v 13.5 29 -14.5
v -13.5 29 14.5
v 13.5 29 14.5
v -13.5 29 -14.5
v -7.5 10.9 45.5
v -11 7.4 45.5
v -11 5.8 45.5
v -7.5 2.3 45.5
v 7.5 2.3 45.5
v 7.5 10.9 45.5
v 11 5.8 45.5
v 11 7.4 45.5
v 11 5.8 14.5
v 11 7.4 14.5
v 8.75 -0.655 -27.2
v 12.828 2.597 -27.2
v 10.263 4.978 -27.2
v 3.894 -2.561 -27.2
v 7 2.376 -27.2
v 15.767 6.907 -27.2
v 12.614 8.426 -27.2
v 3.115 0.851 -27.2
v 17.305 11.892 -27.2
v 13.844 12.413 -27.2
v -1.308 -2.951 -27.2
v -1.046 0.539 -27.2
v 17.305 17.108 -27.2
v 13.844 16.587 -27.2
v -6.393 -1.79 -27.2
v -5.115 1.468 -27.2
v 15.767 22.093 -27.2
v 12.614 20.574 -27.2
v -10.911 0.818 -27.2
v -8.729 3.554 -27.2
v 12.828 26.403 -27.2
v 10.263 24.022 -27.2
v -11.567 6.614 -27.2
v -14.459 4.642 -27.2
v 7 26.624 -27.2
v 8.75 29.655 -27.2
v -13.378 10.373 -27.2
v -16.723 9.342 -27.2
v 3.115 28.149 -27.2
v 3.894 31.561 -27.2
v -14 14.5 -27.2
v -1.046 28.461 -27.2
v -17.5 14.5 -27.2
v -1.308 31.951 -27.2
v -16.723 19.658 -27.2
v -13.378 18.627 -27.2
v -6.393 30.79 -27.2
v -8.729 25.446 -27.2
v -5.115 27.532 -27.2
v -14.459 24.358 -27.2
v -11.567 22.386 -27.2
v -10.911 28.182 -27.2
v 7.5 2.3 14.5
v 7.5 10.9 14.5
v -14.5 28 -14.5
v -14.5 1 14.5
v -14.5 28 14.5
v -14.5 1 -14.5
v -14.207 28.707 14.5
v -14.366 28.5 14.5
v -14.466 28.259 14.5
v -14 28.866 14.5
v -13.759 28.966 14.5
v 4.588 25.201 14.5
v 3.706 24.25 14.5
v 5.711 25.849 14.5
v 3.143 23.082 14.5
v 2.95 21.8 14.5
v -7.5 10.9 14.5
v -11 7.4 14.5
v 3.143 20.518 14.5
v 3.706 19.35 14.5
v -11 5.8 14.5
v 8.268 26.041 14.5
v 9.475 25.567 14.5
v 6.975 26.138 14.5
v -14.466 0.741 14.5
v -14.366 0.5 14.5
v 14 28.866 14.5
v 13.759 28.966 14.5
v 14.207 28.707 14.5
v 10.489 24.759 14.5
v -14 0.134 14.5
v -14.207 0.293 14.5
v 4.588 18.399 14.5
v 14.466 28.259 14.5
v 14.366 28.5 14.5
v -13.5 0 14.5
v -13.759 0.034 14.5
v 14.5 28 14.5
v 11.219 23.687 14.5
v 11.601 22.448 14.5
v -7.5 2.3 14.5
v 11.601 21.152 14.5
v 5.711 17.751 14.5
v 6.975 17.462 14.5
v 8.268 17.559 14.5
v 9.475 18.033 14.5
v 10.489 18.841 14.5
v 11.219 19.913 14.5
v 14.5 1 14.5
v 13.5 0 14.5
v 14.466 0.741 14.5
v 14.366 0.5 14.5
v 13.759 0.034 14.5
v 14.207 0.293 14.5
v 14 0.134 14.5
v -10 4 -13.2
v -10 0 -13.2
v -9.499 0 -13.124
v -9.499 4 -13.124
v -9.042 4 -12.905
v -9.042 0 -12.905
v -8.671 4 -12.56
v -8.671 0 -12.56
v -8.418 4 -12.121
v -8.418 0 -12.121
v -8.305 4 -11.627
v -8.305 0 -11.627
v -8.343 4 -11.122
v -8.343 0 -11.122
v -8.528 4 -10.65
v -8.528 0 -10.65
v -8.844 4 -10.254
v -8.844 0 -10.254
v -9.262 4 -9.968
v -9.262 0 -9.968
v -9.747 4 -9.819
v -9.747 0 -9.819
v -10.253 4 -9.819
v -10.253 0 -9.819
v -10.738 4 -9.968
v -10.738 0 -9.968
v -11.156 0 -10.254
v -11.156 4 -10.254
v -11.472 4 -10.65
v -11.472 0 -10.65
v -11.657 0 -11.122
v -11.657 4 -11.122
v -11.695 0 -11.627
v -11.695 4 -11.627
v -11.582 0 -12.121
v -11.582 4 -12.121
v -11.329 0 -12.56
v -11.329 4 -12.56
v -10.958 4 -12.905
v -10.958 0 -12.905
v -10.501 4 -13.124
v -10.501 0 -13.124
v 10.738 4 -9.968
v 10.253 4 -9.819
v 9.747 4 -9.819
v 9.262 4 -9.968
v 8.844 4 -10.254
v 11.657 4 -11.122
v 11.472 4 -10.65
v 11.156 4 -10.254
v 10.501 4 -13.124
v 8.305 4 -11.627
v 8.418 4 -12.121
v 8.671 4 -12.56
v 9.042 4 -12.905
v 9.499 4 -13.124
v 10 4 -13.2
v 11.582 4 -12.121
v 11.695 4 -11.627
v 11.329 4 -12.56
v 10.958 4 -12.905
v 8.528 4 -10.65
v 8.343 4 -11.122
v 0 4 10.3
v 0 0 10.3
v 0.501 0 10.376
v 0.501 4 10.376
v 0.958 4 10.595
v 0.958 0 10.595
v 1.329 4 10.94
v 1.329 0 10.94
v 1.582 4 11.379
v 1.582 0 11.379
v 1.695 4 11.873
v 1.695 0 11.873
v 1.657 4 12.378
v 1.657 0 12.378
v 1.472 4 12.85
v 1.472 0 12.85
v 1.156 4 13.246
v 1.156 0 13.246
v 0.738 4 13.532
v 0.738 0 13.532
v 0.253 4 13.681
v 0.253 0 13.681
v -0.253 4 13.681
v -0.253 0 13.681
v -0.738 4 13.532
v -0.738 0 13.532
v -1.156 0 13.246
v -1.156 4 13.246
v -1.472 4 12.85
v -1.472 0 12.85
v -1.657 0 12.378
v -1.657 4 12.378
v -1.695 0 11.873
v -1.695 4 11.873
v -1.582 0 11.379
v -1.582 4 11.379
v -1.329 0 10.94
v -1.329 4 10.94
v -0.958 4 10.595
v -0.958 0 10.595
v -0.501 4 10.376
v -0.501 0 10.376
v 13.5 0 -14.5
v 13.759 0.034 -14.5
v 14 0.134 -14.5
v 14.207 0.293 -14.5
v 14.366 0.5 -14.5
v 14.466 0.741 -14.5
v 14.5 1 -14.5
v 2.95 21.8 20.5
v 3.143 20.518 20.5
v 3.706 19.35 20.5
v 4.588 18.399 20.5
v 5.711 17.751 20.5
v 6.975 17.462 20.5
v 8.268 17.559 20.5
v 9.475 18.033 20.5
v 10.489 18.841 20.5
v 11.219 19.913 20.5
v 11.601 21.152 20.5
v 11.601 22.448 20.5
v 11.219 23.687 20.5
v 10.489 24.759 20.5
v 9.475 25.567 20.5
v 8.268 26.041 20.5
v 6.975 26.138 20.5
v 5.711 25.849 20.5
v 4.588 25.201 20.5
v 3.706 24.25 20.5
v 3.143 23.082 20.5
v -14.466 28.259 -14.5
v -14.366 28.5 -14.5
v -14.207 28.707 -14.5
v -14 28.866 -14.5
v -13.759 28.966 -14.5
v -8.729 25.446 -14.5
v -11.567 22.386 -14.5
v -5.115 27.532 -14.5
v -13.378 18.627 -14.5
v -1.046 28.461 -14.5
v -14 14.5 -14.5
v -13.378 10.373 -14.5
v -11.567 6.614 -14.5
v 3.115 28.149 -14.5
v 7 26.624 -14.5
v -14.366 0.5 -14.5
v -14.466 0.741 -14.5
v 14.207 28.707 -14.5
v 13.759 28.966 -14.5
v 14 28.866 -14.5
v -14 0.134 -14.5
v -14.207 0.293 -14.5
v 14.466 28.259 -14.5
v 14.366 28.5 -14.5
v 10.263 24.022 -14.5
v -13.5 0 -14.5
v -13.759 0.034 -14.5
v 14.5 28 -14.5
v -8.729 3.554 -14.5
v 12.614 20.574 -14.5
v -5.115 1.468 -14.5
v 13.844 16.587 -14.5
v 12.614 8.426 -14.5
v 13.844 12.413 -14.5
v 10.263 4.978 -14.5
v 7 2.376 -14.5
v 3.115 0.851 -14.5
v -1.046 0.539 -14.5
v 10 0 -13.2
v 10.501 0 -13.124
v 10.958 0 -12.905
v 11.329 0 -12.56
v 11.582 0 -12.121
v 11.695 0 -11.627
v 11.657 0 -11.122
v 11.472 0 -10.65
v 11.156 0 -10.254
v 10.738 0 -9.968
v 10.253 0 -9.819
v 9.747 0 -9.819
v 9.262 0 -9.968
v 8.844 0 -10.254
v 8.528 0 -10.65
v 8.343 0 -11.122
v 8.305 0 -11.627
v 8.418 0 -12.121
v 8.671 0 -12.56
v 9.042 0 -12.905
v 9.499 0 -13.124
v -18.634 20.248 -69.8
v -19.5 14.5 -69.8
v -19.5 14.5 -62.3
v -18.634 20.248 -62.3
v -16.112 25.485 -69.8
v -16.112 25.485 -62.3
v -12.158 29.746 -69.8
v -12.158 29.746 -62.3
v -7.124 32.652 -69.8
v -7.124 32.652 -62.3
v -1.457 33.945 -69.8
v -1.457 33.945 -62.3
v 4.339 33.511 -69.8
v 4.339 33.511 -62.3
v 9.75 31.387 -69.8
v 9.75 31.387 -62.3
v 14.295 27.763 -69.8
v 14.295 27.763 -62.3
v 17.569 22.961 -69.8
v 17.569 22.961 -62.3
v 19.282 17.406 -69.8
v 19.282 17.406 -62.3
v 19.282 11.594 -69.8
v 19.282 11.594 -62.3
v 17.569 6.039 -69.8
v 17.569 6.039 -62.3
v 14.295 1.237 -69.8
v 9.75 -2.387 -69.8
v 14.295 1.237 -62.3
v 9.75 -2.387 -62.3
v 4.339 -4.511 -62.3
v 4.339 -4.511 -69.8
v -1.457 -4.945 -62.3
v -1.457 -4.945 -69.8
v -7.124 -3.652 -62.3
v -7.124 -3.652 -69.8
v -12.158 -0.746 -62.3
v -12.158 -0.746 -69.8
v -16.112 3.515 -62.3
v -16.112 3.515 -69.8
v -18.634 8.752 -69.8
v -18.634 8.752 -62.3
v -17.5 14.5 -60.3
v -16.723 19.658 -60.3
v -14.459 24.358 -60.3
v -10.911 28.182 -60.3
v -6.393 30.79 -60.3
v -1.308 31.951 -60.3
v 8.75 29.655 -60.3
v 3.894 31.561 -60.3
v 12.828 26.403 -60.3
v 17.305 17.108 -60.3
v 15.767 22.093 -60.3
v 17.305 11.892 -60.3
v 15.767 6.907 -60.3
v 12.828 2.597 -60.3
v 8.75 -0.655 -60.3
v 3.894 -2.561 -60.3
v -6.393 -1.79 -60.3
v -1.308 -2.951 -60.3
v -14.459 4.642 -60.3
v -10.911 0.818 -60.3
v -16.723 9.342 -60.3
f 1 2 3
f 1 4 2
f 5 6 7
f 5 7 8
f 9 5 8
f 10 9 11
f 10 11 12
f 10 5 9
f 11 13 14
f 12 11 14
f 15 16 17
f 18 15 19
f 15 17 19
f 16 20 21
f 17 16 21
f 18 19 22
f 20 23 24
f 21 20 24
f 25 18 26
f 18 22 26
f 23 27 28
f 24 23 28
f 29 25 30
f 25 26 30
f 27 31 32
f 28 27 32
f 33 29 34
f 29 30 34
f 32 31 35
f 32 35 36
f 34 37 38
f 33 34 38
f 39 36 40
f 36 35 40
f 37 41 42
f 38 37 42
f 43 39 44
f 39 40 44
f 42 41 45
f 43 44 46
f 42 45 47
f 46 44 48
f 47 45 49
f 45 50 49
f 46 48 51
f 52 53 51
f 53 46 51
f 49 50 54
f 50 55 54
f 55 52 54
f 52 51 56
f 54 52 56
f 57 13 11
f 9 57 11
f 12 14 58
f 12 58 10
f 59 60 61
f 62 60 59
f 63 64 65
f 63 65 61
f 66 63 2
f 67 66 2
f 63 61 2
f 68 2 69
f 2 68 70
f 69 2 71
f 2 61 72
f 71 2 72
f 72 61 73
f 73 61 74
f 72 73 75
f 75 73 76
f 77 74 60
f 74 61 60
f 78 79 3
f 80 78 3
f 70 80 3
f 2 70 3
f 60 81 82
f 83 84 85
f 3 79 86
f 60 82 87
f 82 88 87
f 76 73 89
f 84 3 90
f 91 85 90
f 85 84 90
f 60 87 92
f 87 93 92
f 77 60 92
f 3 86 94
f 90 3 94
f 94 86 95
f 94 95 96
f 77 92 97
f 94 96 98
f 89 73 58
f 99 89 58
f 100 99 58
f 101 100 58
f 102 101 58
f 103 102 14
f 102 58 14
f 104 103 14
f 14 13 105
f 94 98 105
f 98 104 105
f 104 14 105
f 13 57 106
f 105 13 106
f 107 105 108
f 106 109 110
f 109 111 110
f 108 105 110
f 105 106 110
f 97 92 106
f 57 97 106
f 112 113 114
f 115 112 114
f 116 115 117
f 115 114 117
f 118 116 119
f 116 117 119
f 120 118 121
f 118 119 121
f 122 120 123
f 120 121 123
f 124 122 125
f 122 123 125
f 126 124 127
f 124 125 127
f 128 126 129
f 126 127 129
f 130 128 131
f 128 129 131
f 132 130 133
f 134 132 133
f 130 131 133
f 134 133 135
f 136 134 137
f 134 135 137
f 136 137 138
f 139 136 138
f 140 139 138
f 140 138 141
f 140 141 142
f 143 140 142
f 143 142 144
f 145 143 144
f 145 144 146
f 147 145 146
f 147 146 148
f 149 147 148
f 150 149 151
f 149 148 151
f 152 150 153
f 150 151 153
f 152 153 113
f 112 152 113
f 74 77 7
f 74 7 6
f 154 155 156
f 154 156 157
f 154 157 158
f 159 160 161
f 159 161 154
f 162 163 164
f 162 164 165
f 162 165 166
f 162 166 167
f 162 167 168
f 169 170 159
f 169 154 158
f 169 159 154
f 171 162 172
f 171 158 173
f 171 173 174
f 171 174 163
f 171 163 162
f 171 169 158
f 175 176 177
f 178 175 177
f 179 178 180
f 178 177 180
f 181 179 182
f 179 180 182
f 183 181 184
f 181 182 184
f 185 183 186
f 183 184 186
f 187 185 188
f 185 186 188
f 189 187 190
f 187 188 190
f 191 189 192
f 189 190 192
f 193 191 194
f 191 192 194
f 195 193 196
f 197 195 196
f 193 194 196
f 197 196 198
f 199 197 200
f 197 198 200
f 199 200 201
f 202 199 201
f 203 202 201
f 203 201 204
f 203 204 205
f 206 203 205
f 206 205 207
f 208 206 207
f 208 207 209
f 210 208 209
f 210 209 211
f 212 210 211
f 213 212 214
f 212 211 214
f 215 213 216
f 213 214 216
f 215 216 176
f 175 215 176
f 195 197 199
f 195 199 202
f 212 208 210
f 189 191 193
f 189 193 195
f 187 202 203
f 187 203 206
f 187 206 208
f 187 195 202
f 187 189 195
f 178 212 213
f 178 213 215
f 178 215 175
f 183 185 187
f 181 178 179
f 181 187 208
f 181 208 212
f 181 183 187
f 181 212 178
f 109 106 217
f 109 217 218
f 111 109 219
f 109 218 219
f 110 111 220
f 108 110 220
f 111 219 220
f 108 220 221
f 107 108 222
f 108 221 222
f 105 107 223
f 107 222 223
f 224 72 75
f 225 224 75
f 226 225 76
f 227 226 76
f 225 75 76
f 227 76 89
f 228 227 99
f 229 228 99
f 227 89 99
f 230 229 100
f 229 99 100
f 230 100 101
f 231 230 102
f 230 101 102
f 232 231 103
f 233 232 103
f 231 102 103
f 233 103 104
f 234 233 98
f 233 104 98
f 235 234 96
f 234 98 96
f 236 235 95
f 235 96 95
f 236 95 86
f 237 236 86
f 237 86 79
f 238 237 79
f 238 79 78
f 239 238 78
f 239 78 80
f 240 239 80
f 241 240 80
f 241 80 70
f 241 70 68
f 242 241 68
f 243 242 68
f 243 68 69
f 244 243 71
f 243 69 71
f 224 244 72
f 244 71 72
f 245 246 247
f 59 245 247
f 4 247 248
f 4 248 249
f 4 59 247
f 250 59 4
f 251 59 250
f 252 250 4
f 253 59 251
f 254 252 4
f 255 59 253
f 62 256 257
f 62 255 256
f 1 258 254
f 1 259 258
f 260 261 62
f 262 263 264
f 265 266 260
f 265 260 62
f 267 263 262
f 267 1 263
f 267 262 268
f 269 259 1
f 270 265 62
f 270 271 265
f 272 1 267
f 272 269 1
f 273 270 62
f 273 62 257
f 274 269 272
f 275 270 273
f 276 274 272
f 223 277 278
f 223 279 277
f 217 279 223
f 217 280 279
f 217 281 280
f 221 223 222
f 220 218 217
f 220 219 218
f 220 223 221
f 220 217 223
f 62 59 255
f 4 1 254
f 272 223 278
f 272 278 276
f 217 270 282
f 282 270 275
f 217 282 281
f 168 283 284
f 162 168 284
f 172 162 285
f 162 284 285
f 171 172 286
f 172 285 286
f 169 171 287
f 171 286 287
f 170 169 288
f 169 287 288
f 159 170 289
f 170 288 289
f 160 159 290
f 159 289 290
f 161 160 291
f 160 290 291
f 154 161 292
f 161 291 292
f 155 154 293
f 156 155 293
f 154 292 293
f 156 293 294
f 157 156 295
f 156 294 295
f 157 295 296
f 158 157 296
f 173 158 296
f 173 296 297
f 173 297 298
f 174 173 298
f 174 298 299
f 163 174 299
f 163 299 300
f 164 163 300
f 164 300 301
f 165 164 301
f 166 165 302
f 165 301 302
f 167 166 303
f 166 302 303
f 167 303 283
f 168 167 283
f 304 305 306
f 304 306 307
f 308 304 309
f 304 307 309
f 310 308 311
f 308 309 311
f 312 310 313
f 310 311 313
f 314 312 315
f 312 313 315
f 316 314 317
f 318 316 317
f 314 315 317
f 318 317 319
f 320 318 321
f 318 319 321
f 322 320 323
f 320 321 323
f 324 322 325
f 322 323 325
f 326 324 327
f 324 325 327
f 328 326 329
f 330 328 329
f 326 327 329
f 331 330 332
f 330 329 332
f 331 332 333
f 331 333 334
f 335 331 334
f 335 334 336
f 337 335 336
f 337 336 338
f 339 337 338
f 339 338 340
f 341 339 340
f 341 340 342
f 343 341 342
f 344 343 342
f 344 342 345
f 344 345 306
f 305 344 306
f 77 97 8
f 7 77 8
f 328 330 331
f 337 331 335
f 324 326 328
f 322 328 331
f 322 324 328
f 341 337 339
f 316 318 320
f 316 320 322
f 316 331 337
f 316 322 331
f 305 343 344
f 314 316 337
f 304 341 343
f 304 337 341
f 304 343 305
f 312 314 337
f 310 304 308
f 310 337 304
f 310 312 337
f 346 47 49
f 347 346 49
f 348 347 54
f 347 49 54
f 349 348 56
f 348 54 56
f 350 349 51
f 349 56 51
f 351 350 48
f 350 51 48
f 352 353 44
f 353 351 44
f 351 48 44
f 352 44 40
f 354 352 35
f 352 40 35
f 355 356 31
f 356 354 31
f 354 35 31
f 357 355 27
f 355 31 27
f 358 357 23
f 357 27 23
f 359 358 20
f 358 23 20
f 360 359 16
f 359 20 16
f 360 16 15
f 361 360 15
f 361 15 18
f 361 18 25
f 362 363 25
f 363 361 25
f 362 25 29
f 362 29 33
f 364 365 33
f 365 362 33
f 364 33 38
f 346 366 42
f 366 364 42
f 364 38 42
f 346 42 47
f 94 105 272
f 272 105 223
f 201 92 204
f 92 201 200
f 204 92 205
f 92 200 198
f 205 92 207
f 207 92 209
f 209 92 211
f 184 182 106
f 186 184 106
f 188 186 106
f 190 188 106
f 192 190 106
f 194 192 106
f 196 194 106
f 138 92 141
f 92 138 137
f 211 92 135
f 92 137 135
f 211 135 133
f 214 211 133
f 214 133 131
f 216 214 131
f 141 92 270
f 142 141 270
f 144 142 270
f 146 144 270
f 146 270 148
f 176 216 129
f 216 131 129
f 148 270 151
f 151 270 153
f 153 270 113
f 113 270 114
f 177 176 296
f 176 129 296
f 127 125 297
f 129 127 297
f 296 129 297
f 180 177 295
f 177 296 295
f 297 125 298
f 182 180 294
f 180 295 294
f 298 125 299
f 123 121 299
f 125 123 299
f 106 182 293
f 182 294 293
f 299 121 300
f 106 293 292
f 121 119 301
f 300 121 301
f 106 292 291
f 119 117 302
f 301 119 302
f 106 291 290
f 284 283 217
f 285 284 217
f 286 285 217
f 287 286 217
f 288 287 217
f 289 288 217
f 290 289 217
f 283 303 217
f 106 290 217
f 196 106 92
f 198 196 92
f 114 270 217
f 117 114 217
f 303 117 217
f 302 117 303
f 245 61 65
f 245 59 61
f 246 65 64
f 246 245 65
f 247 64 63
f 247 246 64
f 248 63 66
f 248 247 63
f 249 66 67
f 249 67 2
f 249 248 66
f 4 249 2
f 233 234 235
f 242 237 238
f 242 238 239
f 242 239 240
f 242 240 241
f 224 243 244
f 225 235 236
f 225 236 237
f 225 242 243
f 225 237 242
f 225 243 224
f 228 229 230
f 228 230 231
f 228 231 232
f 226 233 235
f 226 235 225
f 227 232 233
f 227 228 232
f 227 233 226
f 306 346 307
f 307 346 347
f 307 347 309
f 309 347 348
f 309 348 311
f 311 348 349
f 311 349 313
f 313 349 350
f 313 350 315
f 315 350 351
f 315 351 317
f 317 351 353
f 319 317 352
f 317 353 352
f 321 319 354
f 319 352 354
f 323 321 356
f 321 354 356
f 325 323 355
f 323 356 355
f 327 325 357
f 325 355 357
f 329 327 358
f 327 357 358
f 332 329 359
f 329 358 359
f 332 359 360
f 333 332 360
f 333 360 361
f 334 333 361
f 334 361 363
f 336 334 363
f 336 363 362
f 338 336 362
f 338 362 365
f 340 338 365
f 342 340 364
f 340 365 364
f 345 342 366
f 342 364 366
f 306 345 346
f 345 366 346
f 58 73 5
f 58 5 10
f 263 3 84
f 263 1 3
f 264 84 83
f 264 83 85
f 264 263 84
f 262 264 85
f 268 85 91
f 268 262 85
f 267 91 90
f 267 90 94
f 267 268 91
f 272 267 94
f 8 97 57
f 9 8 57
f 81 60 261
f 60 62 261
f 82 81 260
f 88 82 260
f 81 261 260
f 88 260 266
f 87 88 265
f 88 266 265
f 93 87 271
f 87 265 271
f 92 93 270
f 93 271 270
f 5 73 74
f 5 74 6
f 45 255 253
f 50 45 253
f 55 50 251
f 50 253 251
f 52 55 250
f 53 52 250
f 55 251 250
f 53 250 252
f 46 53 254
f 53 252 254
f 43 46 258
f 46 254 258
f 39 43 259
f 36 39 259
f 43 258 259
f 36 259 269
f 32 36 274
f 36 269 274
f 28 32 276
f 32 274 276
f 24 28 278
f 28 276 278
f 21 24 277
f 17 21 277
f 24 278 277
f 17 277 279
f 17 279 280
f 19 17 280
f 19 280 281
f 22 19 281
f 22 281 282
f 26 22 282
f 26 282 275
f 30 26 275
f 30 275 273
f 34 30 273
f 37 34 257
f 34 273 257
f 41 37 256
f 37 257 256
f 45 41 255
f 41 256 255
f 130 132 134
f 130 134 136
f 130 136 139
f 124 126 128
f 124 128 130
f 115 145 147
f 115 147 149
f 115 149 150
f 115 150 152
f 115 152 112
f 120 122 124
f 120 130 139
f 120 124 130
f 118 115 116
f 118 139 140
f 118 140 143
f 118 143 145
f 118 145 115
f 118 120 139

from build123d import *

# Parameters (mm, degrees)
SKETCH_1_W          = 29
SKETCH_1_H          = 29
EXTRUDE_1_DEPTH     = 29
SKETCH_2_R          = 1.7
CUT_EXTRUDE_1_DEPTH = 4
SKETCH_3_R          = 14
EXTRUDE_2_DEPTH     = 12.7
SKETCH_4_R          = 17.5
EXTRUDE_3_DEPTH     = 32.6
SKETCH_6_R          = 19.5
EXTRUDE_4_DEPTH     = 10
CHAMFER_1_SIZE      = 2.5
FILLET_1_R          = 1
SKETCH_7_W          = 22
SKETCH_7_H          = 8.6
EXTRUDE_5_DEPTH     = 31
SKETCH_8_R          = 4.35
EXTRUDE_6_DEPTH     = 6
CHAMFER_2_SIZE      = 3.5


with BuildPart() as part:
    # 草图1 → 凸台-拉伸1 (new body)
    with BuildSketch(Plane(origin=(0, 0, 0), x_dir=(1, 0, 0), z_dir=(0, 1, 0))):
        Rectangle(SKETCH_1_W, SKETCH_1_H)
    extrude(amount=EXTRUDE_1_DEPTH)

    # 草图2 → 切除-拉伸1 (cut)
    with BuildSketch(Plane.XZ):
        with Locations(Location((-10, -11.5, 0), (0, 0, 270))):
            Circle(SKETCH_2_R)
        with Locations(Location((10, -11.5, 0), (0, 0, 270))):
            Circle(SKETCH_2_R)
        with Locations(Location((0, 12, 0), (0, 0, 270))):
            Circle(SKETCH_2_R)
    extrude(amount=-CUT_EXTRUDE_1_DEPTH, mode=Mode.SUBTRACT)

    # 草图3 → 凸台-拉伸2 (add)
    with BuildSketch(Plane(origin=(0, 0, -14.5), x_dir=(-1, 0, 0), z_dir=(0, 0, -1))):
        with Locations((0, 14.5)):
            Circle(SKETCH_3_R)
    extrude(amount=EXTRUDE_2_DEPTH)

    # 草图4 → 凸台-拉伸3 (add)
    with BuildSketch(Plane(origin=(0, 0, -27.2), x_dir=(-1, 0, 0), z_dir=(0, 0, -1))):
        with Locations((0, 14.5)):
            Circle(SKETCH_4_R)
    extrude(amount=EXTRUDE_3_DEPTH)

    # 草图6 → 凸台-拉伸4 (add)
    with BuildSketch(Plane(origin=(0, 0, -59.8), x_dir=(-1, 0, 0), z_dir=(0, 0, -1))):
        with Locations((0, 14.5)):
            Circle(SKETCH_6_R)
    extrude(amount=EXTRUDE_4_DEPTH)

    # 倒角1
    # the kernel refuses this chamfer: 2.5 mm, written as the material it takes off along each edge
    with BuildSketch(Plane(origin=(0, 14.5, -59.8), x_dir=(-1, 0, 0), z_dir=(0, -1, 0))) as chamfer_1_piece_1_section:
        Polygon((19.5, CHAMFER_1_SIZE), (19.5 - CHAMFER_1_SIZE, 0), (19.5, 0), align=None)
    chamfer_1_piece_1 = revolve(axis=Axis((0, 14.5, -59.8), (0, 0, -1)), mode=Mode.PRIVATE)
    chamfer_1_piece_1 = chamfer_1_piece_1 - Plane(origin=(0, 14.5, -61.283957384), x_dir=(-1, 0, 0), z_dir=(0, 0, 1)) * Cylinder(17.5, 78, mode=Mode.PRIVATE)
    add(chamfer_1_piece_1, mode=Mode.SUBTRACT)

    # 圆角1
    fillet_1_edges = [part.edges().sort_by_distance(p)[0] for p in [
        (-14.5, 29, 0),
        (14.5, 29, 0),
        (-14.5, 0, 0),
        (14.5, 0, 0),
    ]]
    fillet(fillet_1_edges, radius=FILLET_1_R)

    # 草图7 → 凸台-拉伸5 (add)
    with BuildSketch(Plane.XY.offset(14.5)):
        with Locations((0, 6.6)):
            Rectangle(SKETCH_7_W, SKETCH_7_H)
    extrude(amount=EXTRUDE_5_DEPTH)

    # 草图8 → 凸台-拉伸6 (add)
    with BuildSketch(Plane.XY.offset(14.5)):
        with Locations(Location((7.3, 21.8, 0), (0, 0, 180))):
            Circle(SKETCH_8_R)
    extrude(amount=EXTRUDE_6_DEPTH)

    # 倒角2
    chamfer_2_edges = [part.edges().sort_by_distance(p)[0] for p in [
        (-11, 10.9, 30),
        (-11, 2.3, 30),
        (11, 2.3, 30),
        (11, 10.9, 30),
    ]]
    chamfer(chamfer_2_edges, length=CHAMFER_2_SIZE)


solid = part.part
